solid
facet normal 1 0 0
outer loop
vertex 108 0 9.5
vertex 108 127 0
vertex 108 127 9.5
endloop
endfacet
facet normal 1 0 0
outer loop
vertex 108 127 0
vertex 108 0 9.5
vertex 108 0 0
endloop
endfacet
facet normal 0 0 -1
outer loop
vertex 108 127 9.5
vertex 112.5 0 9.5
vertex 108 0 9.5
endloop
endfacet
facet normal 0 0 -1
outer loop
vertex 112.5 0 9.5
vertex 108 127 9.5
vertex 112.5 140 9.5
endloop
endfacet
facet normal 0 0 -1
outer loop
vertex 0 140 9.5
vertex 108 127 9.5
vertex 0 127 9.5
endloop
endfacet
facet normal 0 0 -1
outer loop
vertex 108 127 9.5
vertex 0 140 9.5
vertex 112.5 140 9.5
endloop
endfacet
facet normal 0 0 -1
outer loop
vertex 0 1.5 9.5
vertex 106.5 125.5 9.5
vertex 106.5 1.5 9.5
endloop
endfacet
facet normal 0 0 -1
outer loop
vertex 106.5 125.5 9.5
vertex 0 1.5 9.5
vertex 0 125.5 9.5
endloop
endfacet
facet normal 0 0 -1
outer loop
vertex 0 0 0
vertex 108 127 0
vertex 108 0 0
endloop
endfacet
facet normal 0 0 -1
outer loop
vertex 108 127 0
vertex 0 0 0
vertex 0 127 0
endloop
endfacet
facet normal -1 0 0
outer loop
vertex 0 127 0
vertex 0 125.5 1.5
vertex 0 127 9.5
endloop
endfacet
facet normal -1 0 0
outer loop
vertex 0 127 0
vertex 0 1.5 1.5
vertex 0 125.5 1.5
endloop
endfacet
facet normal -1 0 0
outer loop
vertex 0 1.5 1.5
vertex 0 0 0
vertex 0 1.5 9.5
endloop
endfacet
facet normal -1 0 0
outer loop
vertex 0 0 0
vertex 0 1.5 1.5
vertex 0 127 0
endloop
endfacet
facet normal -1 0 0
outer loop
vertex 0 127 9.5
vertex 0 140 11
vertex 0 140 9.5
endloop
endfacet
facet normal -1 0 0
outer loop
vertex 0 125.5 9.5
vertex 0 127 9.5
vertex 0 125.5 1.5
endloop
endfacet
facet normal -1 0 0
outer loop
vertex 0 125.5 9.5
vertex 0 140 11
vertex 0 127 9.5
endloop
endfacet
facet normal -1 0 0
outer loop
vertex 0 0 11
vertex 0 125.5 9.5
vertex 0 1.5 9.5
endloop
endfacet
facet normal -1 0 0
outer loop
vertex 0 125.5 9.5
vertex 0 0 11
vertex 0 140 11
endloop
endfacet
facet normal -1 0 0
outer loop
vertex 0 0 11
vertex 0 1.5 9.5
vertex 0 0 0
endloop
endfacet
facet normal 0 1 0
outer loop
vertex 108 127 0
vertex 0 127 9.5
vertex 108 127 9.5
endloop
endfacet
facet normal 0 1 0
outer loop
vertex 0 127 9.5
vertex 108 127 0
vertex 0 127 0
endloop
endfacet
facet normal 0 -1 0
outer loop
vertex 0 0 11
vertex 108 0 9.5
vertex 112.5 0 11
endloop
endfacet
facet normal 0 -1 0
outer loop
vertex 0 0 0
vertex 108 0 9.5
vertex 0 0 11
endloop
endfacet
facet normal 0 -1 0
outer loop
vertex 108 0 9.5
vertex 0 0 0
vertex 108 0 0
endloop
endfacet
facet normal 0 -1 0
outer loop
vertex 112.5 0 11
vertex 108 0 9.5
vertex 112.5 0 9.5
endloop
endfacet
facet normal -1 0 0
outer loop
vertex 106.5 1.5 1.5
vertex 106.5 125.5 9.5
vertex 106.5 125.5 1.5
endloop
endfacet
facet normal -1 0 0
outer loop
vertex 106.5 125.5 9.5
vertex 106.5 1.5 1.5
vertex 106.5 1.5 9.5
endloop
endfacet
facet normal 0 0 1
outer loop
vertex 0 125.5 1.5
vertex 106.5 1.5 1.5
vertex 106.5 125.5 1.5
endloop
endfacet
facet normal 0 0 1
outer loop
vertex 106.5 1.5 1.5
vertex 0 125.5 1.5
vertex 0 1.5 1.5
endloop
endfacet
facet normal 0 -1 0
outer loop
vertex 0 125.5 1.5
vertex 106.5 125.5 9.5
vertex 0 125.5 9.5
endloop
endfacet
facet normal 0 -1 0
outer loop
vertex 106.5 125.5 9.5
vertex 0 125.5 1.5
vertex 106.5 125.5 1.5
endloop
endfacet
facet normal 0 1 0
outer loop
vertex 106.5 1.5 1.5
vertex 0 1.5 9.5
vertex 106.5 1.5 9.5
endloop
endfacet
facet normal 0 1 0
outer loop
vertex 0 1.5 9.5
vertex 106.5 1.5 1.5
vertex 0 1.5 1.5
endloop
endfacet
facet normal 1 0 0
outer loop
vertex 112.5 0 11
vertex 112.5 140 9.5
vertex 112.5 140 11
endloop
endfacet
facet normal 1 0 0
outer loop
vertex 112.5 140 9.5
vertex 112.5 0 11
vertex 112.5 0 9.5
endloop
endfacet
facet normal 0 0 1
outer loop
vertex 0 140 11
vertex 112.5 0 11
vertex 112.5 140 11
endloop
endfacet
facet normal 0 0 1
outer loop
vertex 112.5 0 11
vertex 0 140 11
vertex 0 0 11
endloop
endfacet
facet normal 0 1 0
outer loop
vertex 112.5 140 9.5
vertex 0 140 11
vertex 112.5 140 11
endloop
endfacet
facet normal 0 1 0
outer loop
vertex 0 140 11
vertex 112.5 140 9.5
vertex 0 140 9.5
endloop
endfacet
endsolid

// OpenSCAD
$fn=100;

// Measurement of the Samsung T310 8" tablet, which is used as template
tds_tablet_width=210;
tds_tablet_depth=124;
tds_tablet_height=8;
tds_frame_width=225;
tds_frame_depth=140;
tds_tablet_display_width=172;
tds_tablet_display_height=102;

// This are intermediate variables i used for potentially changing someting. 
tds_mf_material_thickness=1.5;
tds_mf_width=tds_tablet_width/2;
tds_mf_depth=tds_tablet_depth;
tds_mf_height=tds_tablet_height;
tds_mf_frame_width=tds_frame_width/2;
tds_mf_frame_depth=tds_frame_depth;

// The case for the tablet
module tablet_case(w, d, h, t) {
    difference() {
        cube([w + t * 2, 
                d + t * 2, 
                h + t]);

        translate([-1, t, t])
        cube([w + t + 1, d, h + 1]);
    }
}
color("grey")
translate([0,0,tds_mf_material_thickness + tds_tablet_height])
cube([tds_mf_frame_width, tds_mf_frame_depth, tds_mf_material_thickness]);
tablet_case(tds_mf_width, tds_mf_depth, tds_mf_height, tds_mf_material_thickness);
